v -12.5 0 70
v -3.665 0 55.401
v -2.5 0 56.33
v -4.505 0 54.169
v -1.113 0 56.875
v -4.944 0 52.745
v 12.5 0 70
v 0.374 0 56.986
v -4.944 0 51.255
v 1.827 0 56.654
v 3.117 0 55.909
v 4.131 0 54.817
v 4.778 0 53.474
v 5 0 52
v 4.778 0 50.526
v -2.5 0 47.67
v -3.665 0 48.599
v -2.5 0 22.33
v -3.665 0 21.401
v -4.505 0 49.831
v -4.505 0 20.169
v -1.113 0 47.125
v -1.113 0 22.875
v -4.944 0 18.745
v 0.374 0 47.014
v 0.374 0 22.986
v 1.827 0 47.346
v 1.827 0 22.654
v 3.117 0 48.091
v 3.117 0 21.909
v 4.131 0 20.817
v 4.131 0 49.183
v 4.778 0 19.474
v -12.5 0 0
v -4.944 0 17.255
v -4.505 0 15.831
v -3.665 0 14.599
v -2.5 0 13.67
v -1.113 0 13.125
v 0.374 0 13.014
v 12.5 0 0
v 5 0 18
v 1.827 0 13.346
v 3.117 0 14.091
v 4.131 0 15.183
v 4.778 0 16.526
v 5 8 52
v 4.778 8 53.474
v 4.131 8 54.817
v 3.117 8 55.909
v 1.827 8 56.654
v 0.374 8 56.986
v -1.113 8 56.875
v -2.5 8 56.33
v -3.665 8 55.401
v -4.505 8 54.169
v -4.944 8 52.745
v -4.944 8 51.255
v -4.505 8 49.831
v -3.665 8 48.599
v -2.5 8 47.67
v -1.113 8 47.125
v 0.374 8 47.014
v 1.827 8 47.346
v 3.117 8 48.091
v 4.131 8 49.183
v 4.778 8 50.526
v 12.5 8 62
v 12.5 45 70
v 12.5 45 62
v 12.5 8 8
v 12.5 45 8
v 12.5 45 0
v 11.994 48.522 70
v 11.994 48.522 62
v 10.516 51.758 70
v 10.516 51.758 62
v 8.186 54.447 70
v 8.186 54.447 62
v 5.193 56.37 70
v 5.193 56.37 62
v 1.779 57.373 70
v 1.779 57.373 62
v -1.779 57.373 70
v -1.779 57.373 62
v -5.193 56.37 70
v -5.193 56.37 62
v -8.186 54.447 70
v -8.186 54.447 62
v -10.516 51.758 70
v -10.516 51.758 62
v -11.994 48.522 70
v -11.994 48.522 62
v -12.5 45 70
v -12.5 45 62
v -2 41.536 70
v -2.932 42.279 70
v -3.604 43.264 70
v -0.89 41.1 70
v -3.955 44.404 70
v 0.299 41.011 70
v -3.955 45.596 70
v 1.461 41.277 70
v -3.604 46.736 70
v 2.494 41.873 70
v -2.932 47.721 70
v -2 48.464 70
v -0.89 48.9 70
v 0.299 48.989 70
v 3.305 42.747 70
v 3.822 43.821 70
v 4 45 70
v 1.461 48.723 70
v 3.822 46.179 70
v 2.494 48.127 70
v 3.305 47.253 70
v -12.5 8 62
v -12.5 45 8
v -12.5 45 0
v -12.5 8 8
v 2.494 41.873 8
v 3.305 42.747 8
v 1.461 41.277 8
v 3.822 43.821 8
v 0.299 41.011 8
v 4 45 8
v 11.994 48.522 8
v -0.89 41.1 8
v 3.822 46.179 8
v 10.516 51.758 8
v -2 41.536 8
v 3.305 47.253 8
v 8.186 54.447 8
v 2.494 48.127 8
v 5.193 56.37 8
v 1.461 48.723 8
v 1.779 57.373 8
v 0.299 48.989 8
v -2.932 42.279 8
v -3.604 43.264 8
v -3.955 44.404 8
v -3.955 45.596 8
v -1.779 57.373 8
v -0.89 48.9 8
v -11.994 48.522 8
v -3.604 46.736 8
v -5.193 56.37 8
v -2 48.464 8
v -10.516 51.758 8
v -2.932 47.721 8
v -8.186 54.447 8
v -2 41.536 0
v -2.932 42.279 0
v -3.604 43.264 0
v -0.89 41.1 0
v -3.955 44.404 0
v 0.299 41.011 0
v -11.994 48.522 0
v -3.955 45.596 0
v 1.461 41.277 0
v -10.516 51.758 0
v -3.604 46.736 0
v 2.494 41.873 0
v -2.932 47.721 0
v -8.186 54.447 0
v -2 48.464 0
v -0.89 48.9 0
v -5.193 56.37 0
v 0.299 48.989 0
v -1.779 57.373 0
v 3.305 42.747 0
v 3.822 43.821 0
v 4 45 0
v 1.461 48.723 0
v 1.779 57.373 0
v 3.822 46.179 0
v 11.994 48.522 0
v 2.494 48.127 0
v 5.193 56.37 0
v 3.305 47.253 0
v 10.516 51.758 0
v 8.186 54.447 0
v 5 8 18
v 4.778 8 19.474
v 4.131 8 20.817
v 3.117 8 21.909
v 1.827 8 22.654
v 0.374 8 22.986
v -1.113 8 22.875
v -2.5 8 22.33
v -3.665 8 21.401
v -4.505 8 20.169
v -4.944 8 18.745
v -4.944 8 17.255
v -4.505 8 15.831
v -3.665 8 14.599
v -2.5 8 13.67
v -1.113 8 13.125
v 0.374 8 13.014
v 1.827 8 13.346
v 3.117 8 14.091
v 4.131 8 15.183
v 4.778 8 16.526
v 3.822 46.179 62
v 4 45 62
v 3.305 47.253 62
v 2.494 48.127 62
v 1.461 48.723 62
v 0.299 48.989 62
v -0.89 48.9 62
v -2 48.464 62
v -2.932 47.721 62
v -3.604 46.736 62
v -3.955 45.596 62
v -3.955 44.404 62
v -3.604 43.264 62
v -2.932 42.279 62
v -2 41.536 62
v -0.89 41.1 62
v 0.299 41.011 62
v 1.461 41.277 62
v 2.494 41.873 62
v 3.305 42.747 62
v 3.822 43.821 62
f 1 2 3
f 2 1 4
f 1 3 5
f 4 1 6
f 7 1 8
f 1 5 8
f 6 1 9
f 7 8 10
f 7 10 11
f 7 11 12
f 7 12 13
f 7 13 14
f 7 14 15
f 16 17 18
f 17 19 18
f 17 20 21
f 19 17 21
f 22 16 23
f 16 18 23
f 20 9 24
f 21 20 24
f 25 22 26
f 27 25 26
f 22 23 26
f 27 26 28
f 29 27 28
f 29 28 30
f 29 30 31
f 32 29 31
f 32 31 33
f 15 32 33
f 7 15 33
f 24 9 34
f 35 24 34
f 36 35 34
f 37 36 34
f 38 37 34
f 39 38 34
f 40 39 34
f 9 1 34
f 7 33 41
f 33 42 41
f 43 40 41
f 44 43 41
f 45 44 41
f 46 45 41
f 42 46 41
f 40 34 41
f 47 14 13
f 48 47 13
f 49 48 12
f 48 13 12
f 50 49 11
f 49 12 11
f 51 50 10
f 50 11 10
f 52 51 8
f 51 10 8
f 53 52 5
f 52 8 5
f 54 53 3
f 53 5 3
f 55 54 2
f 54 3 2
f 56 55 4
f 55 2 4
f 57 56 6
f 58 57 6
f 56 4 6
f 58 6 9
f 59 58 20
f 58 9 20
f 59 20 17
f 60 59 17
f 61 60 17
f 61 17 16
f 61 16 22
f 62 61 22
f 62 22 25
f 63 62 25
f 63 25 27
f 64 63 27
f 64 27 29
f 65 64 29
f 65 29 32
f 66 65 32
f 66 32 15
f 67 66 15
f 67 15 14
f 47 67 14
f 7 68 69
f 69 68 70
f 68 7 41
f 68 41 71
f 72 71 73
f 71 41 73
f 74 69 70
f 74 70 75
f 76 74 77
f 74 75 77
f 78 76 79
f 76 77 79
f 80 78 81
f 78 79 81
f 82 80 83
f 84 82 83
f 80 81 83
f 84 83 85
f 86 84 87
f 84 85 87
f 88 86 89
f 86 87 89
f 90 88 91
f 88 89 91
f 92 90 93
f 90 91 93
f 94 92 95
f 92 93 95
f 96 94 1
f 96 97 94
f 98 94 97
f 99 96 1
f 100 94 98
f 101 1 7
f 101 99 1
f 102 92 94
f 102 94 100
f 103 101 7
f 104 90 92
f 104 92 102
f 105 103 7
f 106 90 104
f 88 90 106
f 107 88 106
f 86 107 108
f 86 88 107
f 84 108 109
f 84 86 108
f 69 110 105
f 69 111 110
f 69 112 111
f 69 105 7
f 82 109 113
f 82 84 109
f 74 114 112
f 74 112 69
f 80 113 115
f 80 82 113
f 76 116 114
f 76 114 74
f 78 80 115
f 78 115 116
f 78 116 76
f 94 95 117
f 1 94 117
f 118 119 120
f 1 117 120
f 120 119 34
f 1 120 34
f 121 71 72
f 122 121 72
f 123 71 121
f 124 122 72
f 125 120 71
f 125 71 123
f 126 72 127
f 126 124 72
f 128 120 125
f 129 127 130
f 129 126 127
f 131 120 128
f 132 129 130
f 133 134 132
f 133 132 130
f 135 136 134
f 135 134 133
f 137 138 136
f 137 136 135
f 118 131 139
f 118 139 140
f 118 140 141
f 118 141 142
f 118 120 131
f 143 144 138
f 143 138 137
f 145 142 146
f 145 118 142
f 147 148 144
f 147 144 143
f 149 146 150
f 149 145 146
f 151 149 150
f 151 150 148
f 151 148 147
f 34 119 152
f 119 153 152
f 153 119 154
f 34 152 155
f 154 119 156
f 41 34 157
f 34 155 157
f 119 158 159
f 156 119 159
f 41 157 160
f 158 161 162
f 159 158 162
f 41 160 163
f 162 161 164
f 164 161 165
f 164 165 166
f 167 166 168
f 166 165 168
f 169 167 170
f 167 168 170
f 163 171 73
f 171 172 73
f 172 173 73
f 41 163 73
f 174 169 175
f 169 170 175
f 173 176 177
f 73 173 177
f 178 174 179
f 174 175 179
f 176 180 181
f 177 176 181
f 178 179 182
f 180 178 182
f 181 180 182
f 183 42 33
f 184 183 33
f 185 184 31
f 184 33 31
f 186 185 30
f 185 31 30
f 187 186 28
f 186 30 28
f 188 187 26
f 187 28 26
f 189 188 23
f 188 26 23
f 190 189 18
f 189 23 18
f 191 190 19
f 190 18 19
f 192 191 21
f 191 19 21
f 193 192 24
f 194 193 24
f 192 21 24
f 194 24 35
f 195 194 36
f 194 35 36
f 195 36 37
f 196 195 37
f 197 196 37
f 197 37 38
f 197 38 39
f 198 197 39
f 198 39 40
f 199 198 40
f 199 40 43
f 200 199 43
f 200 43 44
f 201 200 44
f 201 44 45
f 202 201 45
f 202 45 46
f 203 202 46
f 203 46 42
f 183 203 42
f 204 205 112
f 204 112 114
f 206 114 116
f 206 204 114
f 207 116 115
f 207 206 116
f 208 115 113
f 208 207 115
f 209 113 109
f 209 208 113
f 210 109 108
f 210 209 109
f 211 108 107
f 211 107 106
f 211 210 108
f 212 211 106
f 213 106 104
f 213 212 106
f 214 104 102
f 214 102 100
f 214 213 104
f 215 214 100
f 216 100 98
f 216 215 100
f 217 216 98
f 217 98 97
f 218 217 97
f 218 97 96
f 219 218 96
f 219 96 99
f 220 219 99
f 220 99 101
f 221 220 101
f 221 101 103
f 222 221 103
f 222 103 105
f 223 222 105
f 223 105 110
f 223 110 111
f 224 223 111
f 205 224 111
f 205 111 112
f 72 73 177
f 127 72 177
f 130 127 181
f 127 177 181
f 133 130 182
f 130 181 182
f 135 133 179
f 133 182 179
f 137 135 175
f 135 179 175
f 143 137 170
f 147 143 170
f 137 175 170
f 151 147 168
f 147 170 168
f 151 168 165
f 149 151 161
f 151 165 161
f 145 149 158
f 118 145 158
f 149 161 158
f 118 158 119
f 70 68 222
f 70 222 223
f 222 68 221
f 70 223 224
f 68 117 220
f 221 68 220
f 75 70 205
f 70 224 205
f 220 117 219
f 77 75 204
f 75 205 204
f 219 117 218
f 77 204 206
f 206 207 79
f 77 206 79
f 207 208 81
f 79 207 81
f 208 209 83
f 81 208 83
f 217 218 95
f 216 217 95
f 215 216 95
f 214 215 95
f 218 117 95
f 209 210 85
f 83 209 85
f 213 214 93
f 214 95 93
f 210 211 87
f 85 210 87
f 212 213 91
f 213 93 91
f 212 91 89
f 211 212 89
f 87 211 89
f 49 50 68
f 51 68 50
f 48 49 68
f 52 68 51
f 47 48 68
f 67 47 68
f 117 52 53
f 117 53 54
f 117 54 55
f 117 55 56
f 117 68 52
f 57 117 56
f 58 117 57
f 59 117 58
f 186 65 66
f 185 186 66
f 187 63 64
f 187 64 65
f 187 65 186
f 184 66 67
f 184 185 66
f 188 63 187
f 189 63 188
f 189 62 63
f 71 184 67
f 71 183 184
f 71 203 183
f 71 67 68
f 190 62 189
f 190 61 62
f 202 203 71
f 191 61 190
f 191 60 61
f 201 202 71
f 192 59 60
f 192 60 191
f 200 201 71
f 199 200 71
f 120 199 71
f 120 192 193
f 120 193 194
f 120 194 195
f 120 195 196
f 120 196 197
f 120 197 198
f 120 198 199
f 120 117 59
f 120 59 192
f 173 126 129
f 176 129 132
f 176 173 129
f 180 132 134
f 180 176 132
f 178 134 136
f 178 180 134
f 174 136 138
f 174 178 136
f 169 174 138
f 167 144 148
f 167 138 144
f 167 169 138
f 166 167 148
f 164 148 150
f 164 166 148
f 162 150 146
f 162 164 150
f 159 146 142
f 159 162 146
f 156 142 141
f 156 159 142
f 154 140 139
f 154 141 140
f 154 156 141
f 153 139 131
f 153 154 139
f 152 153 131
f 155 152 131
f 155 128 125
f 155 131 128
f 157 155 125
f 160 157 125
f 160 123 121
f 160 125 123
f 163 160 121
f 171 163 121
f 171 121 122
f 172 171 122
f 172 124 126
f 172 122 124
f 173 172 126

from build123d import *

# Parameters (mm, degrees)
SCHIZZO1_R                    = 4
ESTRUSIONE_ESTRUSIONE1_DEPTH  = 70
TAGLIO_ESTRUSIONE1_DEPTH      = 92.446705791
TAGLIO_ESTRUSIONE1_DEPTH_BACK = 92.446705791
SCHIZZO2_W                    = 54
SCHIZZO2_H                    = 49.5
SCHIZZO4_R                    = 5
TAGLIO_ESTRUSIONE2_DEPTH      = 92.446705791


with BuildPart() as part:
    # Schizzo1 → Estrusione-Estrusione1 (new body)
    with BuildSketch(Plane.XY):
        with BuildLine():
            Line((-12.5, 0), (12.5, 0))
            Line((12.5, 0), (12.5, 45))
            ThreePointArc((12.5, 45), (0, 57.5), (-12.5, 45))
            Line((-12.5, 45), (-12.5, 0))
        make_face()
        with Locations((0, 45)):
            Circle(SCHIZZO1_R, mode=Mode.SUBTRACT)
    extrude(amount=ESTRUSIONE_ESTRUSIONE1_DEPTH)

    # Schizzo2 → Taglio-Estrusione1 (cut, two sides: drawn at the far end of the back side and taken through both)
    with BuildSketch(Plane(origin=(0, 0, 0), x_dir=(0, 0, -1), z_dir=(1, 0, 0)).offset(-TAGLIO_ESTRUSIONE1_DEPTH_BACK)):
        with Locations((-35, 32.75)):
            Rectangle(SCHIZZO2_W, SCHIZZO2_H)
    extrude(amount=TAGLIO_ESTRUSIONE1_DEPTH + TAGLIO_ESTRUSIONE1_DEPTH_BACK, mode=Mode.SUBTRACT)

    # Schizzo4 → Taglio-Estrusione2 (cut, through all)
    with BuildSketch(Plane.XZ):
        with Locations((0, 18)):
            Circle(SCHIZZO4_R)
        with Locations((0, 52)):
            Circle(SCHIZZO4_R)
    extrude(amount=-TAGLIO_ESTRUSIONE2_DEPTH, mode=Mode.SUBTRACT)


solid = part.part
